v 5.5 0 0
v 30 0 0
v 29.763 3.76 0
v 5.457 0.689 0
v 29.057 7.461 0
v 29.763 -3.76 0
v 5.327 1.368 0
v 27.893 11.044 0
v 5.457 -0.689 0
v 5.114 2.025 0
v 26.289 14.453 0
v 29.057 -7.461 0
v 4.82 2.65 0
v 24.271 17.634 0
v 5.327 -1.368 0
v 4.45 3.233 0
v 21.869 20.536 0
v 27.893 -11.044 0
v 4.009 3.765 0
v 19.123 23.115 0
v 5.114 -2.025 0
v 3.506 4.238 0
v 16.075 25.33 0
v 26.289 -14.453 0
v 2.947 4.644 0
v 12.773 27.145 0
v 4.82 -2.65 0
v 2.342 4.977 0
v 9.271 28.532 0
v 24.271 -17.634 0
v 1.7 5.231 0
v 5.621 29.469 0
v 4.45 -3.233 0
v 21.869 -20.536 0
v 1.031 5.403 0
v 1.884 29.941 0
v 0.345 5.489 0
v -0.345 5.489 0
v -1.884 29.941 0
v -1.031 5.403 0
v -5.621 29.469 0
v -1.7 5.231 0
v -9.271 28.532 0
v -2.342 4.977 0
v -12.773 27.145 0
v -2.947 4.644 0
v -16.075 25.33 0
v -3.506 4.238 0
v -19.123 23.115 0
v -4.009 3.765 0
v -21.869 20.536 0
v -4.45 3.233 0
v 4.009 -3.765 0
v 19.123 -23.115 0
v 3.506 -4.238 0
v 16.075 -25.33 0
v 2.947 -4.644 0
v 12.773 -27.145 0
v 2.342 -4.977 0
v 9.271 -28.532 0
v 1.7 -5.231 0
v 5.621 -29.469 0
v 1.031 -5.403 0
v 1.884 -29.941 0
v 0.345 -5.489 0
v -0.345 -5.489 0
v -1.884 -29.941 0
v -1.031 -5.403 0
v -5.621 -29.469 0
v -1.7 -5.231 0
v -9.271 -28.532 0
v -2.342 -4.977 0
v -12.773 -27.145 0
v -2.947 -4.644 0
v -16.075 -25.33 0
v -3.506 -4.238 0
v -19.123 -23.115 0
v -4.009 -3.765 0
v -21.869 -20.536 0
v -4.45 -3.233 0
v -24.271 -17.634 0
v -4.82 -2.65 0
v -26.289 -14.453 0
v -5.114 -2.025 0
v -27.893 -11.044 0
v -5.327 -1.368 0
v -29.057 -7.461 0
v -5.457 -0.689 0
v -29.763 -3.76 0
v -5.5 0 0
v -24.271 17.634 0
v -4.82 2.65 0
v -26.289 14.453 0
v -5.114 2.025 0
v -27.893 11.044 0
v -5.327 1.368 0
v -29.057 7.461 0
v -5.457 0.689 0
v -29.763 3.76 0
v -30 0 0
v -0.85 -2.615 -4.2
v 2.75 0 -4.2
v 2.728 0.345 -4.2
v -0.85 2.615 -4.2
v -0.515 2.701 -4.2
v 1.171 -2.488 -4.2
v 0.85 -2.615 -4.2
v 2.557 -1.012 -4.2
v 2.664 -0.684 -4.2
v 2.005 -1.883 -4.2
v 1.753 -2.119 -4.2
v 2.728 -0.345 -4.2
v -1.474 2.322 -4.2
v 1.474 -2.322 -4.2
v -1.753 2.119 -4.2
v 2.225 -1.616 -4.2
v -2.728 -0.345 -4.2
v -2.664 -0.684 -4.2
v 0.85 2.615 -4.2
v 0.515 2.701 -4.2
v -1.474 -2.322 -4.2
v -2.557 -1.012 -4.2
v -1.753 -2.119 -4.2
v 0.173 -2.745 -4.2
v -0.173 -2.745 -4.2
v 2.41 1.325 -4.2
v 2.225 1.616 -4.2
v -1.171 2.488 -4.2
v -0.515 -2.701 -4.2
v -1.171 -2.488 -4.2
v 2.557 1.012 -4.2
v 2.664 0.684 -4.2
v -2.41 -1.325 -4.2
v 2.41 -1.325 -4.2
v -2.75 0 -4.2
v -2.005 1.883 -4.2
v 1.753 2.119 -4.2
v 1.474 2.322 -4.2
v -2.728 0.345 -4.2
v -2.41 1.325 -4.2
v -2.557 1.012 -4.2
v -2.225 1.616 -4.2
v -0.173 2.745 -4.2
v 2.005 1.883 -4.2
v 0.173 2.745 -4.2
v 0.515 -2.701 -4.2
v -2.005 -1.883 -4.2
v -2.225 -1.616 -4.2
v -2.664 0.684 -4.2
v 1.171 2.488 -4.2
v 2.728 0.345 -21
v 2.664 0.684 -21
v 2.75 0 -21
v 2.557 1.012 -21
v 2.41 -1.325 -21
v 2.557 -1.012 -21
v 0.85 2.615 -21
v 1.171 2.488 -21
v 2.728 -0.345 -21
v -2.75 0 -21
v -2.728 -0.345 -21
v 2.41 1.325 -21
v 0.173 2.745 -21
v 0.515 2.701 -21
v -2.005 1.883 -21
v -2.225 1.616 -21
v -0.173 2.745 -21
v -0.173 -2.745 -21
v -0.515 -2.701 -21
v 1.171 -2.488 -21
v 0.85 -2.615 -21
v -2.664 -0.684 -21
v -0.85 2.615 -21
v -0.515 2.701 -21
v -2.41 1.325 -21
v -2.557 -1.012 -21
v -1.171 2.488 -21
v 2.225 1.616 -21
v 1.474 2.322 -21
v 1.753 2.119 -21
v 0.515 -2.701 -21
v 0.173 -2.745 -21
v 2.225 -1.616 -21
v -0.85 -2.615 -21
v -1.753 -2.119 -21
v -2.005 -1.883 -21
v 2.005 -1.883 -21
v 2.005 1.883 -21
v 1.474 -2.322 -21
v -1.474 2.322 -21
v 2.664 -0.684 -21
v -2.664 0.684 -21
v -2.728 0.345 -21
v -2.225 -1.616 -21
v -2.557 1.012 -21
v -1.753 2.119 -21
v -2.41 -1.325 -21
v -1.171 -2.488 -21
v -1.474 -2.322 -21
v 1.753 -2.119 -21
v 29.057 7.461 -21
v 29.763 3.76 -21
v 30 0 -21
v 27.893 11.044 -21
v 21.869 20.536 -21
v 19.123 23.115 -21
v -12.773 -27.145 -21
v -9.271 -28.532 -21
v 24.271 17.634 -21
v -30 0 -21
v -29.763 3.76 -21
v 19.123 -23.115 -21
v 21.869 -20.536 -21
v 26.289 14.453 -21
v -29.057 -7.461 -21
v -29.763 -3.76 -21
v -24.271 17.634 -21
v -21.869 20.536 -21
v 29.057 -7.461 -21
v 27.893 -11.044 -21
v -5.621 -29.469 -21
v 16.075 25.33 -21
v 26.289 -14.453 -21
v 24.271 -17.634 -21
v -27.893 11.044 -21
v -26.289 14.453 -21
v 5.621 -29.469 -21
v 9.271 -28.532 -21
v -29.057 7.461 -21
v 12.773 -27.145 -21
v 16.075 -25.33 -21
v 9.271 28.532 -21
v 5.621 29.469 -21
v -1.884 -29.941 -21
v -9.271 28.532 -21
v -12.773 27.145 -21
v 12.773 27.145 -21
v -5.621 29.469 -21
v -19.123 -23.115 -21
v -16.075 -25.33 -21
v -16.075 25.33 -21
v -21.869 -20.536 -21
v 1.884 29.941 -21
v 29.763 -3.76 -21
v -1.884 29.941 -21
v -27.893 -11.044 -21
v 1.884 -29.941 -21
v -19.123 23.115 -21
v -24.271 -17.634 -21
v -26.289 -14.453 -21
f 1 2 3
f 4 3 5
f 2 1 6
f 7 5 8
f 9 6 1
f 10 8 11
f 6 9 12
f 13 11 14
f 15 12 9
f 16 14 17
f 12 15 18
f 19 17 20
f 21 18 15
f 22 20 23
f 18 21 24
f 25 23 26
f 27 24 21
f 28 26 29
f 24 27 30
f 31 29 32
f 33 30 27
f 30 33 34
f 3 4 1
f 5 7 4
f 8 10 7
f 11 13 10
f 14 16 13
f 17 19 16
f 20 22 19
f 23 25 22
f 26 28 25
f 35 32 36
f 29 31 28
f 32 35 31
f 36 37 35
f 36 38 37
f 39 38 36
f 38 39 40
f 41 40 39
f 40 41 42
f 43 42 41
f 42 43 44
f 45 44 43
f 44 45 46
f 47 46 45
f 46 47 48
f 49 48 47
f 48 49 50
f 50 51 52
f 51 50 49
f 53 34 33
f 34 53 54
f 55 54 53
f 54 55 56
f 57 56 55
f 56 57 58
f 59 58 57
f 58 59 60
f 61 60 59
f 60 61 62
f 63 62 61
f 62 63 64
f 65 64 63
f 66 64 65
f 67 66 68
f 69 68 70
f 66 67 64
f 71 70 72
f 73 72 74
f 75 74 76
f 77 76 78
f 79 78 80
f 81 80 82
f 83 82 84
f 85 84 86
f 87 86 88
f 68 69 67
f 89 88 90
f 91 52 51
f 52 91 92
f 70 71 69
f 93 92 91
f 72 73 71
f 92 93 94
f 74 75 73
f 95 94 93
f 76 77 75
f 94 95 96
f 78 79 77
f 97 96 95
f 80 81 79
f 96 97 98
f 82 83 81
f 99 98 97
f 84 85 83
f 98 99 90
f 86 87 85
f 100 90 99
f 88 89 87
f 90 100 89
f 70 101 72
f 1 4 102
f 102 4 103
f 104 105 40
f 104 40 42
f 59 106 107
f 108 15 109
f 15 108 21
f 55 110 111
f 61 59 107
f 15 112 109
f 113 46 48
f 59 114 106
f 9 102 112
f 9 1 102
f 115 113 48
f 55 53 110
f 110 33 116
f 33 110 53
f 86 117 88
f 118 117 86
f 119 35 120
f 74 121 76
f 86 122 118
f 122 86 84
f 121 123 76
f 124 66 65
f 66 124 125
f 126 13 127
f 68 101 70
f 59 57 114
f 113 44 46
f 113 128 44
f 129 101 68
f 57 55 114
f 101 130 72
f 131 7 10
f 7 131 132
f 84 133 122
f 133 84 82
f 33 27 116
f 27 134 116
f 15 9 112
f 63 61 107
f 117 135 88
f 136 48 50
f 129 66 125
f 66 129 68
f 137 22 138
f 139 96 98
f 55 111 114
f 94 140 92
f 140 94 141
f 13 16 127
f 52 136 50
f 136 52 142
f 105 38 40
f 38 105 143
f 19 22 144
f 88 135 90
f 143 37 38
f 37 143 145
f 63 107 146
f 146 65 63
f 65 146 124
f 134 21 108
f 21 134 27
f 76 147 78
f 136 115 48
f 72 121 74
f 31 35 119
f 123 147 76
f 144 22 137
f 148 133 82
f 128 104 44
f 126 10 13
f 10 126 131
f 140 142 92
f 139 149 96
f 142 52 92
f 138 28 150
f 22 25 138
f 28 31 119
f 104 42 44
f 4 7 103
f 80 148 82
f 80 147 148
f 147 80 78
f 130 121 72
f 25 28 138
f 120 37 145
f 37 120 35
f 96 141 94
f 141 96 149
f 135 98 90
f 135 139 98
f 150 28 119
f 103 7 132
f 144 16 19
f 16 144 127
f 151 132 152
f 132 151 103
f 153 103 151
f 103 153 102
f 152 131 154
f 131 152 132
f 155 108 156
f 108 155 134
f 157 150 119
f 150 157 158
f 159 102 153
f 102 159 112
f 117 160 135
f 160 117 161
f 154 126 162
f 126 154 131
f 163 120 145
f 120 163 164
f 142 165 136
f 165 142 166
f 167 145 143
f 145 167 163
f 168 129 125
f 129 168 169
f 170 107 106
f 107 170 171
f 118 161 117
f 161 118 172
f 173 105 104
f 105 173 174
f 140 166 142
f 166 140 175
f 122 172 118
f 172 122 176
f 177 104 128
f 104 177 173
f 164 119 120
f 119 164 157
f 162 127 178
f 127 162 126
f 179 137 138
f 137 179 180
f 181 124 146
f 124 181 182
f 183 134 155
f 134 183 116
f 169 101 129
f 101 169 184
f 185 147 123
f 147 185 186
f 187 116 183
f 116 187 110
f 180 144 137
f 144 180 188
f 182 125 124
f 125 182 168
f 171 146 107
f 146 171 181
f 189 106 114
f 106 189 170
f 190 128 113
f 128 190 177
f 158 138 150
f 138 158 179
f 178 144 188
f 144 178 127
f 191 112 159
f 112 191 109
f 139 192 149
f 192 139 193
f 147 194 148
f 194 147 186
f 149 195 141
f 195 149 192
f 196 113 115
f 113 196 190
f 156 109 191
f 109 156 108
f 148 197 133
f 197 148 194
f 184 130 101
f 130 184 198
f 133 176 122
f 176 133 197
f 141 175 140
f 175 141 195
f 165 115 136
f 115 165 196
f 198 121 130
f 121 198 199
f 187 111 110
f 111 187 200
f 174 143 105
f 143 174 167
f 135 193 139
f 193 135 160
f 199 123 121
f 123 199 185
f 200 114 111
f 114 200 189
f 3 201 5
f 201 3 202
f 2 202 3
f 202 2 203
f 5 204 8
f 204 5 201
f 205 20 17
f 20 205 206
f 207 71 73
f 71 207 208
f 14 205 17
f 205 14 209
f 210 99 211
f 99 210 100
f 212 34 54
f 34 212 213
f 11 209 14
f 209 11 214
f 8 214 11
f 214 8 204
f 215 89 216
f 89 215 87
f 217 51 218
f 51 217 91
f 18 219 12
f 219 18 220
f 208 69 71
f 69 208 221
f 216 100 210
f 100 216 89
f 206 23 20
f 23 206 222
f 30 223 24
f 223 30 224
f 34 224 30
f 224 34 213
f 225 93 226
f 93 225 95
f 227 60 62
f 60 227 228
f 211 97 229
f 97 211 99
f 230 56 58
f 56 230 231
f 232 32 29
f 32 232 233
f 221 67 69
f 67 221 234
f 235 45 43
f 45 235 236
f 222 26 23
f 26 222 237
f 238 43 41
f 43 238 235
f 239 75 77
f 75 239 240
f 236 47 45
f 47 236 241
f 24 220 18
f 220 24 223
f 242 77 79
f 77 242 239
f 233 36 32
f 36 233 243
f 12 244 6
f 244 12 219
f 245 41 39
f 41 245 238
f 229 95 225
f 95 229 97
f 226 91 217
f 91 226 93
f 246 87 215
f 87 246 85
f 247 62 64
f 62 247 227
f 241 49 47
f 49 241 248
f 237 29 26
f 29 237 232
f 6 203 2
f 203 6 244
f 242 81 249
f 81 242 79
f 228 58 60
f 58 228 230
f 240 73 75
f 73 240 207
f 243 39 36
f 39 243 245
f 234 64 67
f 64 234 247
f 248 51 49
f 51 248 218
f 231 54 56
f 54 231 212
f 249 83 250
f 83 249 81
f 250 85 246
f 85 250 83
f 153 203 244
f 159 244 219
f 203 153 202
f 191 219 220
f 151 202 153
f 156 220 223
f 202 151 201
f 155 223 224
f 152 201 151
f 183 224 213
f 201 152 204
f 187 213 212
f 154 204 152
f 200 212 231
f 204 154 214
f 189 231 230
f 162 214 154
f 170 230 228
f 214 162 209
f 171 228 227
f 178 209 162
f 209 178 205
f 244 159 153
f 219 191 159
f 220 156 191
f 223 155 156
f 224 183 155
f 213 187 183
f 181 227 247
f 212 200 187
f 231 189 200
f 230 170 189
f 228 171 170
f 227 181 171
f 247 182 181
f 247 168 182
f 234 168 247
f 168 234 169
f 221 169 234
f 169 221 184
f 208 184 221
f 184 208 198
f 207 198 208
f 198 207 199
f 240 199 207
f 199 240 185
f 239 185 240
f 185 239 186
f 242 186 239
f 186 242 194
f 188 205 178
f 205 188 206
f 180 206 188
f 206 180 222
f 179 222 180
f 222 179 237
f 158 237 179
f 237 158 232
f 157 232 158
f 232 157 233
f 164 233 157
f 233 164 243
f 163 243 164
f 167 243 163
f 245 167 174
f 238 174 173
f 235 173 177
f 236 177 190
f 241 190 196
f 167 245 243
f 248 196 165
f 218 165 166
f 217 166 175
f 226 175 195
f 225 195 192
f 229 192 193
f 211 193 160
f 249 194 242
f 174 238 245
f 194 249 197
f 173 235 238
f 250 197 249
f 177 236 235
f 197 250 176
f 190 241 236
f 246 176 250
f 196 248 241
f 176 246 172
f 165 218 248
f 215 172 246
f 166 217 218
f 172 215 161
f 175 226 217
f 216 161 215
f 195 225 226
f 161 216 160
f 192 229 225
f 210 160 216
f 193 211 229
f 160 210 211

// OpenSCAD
$fn = 50;

difference() {
	union() {
		translate(v = [0, 0, -21.0]) {
			cylinder(h = 21, r = 30.0);
		}
	}
	union() {
		translate(v = [0, 0, 0]) {
			rotate(a = [0, 0, 0]) {
				difference() {
					union() {
						translate(v = [0, 0, -24.0]) {
							cylinder(h = 24, r = 2.25);
						}
						translate(v = [0, 0, -4.2]) {
							cylinder(h = 4.2, r1 = 2.75, r2 = 5.5);
						}
						translate(v = [0, 0, -24.0]) {
							cylinder(h = 24, r = 2.75);
						}
						translate(v = [0, 0, -24.0]) {
							cylinder(h = 24, r = 2.25);
						}
					}
					union();
				}
			}
		}
	}
}
